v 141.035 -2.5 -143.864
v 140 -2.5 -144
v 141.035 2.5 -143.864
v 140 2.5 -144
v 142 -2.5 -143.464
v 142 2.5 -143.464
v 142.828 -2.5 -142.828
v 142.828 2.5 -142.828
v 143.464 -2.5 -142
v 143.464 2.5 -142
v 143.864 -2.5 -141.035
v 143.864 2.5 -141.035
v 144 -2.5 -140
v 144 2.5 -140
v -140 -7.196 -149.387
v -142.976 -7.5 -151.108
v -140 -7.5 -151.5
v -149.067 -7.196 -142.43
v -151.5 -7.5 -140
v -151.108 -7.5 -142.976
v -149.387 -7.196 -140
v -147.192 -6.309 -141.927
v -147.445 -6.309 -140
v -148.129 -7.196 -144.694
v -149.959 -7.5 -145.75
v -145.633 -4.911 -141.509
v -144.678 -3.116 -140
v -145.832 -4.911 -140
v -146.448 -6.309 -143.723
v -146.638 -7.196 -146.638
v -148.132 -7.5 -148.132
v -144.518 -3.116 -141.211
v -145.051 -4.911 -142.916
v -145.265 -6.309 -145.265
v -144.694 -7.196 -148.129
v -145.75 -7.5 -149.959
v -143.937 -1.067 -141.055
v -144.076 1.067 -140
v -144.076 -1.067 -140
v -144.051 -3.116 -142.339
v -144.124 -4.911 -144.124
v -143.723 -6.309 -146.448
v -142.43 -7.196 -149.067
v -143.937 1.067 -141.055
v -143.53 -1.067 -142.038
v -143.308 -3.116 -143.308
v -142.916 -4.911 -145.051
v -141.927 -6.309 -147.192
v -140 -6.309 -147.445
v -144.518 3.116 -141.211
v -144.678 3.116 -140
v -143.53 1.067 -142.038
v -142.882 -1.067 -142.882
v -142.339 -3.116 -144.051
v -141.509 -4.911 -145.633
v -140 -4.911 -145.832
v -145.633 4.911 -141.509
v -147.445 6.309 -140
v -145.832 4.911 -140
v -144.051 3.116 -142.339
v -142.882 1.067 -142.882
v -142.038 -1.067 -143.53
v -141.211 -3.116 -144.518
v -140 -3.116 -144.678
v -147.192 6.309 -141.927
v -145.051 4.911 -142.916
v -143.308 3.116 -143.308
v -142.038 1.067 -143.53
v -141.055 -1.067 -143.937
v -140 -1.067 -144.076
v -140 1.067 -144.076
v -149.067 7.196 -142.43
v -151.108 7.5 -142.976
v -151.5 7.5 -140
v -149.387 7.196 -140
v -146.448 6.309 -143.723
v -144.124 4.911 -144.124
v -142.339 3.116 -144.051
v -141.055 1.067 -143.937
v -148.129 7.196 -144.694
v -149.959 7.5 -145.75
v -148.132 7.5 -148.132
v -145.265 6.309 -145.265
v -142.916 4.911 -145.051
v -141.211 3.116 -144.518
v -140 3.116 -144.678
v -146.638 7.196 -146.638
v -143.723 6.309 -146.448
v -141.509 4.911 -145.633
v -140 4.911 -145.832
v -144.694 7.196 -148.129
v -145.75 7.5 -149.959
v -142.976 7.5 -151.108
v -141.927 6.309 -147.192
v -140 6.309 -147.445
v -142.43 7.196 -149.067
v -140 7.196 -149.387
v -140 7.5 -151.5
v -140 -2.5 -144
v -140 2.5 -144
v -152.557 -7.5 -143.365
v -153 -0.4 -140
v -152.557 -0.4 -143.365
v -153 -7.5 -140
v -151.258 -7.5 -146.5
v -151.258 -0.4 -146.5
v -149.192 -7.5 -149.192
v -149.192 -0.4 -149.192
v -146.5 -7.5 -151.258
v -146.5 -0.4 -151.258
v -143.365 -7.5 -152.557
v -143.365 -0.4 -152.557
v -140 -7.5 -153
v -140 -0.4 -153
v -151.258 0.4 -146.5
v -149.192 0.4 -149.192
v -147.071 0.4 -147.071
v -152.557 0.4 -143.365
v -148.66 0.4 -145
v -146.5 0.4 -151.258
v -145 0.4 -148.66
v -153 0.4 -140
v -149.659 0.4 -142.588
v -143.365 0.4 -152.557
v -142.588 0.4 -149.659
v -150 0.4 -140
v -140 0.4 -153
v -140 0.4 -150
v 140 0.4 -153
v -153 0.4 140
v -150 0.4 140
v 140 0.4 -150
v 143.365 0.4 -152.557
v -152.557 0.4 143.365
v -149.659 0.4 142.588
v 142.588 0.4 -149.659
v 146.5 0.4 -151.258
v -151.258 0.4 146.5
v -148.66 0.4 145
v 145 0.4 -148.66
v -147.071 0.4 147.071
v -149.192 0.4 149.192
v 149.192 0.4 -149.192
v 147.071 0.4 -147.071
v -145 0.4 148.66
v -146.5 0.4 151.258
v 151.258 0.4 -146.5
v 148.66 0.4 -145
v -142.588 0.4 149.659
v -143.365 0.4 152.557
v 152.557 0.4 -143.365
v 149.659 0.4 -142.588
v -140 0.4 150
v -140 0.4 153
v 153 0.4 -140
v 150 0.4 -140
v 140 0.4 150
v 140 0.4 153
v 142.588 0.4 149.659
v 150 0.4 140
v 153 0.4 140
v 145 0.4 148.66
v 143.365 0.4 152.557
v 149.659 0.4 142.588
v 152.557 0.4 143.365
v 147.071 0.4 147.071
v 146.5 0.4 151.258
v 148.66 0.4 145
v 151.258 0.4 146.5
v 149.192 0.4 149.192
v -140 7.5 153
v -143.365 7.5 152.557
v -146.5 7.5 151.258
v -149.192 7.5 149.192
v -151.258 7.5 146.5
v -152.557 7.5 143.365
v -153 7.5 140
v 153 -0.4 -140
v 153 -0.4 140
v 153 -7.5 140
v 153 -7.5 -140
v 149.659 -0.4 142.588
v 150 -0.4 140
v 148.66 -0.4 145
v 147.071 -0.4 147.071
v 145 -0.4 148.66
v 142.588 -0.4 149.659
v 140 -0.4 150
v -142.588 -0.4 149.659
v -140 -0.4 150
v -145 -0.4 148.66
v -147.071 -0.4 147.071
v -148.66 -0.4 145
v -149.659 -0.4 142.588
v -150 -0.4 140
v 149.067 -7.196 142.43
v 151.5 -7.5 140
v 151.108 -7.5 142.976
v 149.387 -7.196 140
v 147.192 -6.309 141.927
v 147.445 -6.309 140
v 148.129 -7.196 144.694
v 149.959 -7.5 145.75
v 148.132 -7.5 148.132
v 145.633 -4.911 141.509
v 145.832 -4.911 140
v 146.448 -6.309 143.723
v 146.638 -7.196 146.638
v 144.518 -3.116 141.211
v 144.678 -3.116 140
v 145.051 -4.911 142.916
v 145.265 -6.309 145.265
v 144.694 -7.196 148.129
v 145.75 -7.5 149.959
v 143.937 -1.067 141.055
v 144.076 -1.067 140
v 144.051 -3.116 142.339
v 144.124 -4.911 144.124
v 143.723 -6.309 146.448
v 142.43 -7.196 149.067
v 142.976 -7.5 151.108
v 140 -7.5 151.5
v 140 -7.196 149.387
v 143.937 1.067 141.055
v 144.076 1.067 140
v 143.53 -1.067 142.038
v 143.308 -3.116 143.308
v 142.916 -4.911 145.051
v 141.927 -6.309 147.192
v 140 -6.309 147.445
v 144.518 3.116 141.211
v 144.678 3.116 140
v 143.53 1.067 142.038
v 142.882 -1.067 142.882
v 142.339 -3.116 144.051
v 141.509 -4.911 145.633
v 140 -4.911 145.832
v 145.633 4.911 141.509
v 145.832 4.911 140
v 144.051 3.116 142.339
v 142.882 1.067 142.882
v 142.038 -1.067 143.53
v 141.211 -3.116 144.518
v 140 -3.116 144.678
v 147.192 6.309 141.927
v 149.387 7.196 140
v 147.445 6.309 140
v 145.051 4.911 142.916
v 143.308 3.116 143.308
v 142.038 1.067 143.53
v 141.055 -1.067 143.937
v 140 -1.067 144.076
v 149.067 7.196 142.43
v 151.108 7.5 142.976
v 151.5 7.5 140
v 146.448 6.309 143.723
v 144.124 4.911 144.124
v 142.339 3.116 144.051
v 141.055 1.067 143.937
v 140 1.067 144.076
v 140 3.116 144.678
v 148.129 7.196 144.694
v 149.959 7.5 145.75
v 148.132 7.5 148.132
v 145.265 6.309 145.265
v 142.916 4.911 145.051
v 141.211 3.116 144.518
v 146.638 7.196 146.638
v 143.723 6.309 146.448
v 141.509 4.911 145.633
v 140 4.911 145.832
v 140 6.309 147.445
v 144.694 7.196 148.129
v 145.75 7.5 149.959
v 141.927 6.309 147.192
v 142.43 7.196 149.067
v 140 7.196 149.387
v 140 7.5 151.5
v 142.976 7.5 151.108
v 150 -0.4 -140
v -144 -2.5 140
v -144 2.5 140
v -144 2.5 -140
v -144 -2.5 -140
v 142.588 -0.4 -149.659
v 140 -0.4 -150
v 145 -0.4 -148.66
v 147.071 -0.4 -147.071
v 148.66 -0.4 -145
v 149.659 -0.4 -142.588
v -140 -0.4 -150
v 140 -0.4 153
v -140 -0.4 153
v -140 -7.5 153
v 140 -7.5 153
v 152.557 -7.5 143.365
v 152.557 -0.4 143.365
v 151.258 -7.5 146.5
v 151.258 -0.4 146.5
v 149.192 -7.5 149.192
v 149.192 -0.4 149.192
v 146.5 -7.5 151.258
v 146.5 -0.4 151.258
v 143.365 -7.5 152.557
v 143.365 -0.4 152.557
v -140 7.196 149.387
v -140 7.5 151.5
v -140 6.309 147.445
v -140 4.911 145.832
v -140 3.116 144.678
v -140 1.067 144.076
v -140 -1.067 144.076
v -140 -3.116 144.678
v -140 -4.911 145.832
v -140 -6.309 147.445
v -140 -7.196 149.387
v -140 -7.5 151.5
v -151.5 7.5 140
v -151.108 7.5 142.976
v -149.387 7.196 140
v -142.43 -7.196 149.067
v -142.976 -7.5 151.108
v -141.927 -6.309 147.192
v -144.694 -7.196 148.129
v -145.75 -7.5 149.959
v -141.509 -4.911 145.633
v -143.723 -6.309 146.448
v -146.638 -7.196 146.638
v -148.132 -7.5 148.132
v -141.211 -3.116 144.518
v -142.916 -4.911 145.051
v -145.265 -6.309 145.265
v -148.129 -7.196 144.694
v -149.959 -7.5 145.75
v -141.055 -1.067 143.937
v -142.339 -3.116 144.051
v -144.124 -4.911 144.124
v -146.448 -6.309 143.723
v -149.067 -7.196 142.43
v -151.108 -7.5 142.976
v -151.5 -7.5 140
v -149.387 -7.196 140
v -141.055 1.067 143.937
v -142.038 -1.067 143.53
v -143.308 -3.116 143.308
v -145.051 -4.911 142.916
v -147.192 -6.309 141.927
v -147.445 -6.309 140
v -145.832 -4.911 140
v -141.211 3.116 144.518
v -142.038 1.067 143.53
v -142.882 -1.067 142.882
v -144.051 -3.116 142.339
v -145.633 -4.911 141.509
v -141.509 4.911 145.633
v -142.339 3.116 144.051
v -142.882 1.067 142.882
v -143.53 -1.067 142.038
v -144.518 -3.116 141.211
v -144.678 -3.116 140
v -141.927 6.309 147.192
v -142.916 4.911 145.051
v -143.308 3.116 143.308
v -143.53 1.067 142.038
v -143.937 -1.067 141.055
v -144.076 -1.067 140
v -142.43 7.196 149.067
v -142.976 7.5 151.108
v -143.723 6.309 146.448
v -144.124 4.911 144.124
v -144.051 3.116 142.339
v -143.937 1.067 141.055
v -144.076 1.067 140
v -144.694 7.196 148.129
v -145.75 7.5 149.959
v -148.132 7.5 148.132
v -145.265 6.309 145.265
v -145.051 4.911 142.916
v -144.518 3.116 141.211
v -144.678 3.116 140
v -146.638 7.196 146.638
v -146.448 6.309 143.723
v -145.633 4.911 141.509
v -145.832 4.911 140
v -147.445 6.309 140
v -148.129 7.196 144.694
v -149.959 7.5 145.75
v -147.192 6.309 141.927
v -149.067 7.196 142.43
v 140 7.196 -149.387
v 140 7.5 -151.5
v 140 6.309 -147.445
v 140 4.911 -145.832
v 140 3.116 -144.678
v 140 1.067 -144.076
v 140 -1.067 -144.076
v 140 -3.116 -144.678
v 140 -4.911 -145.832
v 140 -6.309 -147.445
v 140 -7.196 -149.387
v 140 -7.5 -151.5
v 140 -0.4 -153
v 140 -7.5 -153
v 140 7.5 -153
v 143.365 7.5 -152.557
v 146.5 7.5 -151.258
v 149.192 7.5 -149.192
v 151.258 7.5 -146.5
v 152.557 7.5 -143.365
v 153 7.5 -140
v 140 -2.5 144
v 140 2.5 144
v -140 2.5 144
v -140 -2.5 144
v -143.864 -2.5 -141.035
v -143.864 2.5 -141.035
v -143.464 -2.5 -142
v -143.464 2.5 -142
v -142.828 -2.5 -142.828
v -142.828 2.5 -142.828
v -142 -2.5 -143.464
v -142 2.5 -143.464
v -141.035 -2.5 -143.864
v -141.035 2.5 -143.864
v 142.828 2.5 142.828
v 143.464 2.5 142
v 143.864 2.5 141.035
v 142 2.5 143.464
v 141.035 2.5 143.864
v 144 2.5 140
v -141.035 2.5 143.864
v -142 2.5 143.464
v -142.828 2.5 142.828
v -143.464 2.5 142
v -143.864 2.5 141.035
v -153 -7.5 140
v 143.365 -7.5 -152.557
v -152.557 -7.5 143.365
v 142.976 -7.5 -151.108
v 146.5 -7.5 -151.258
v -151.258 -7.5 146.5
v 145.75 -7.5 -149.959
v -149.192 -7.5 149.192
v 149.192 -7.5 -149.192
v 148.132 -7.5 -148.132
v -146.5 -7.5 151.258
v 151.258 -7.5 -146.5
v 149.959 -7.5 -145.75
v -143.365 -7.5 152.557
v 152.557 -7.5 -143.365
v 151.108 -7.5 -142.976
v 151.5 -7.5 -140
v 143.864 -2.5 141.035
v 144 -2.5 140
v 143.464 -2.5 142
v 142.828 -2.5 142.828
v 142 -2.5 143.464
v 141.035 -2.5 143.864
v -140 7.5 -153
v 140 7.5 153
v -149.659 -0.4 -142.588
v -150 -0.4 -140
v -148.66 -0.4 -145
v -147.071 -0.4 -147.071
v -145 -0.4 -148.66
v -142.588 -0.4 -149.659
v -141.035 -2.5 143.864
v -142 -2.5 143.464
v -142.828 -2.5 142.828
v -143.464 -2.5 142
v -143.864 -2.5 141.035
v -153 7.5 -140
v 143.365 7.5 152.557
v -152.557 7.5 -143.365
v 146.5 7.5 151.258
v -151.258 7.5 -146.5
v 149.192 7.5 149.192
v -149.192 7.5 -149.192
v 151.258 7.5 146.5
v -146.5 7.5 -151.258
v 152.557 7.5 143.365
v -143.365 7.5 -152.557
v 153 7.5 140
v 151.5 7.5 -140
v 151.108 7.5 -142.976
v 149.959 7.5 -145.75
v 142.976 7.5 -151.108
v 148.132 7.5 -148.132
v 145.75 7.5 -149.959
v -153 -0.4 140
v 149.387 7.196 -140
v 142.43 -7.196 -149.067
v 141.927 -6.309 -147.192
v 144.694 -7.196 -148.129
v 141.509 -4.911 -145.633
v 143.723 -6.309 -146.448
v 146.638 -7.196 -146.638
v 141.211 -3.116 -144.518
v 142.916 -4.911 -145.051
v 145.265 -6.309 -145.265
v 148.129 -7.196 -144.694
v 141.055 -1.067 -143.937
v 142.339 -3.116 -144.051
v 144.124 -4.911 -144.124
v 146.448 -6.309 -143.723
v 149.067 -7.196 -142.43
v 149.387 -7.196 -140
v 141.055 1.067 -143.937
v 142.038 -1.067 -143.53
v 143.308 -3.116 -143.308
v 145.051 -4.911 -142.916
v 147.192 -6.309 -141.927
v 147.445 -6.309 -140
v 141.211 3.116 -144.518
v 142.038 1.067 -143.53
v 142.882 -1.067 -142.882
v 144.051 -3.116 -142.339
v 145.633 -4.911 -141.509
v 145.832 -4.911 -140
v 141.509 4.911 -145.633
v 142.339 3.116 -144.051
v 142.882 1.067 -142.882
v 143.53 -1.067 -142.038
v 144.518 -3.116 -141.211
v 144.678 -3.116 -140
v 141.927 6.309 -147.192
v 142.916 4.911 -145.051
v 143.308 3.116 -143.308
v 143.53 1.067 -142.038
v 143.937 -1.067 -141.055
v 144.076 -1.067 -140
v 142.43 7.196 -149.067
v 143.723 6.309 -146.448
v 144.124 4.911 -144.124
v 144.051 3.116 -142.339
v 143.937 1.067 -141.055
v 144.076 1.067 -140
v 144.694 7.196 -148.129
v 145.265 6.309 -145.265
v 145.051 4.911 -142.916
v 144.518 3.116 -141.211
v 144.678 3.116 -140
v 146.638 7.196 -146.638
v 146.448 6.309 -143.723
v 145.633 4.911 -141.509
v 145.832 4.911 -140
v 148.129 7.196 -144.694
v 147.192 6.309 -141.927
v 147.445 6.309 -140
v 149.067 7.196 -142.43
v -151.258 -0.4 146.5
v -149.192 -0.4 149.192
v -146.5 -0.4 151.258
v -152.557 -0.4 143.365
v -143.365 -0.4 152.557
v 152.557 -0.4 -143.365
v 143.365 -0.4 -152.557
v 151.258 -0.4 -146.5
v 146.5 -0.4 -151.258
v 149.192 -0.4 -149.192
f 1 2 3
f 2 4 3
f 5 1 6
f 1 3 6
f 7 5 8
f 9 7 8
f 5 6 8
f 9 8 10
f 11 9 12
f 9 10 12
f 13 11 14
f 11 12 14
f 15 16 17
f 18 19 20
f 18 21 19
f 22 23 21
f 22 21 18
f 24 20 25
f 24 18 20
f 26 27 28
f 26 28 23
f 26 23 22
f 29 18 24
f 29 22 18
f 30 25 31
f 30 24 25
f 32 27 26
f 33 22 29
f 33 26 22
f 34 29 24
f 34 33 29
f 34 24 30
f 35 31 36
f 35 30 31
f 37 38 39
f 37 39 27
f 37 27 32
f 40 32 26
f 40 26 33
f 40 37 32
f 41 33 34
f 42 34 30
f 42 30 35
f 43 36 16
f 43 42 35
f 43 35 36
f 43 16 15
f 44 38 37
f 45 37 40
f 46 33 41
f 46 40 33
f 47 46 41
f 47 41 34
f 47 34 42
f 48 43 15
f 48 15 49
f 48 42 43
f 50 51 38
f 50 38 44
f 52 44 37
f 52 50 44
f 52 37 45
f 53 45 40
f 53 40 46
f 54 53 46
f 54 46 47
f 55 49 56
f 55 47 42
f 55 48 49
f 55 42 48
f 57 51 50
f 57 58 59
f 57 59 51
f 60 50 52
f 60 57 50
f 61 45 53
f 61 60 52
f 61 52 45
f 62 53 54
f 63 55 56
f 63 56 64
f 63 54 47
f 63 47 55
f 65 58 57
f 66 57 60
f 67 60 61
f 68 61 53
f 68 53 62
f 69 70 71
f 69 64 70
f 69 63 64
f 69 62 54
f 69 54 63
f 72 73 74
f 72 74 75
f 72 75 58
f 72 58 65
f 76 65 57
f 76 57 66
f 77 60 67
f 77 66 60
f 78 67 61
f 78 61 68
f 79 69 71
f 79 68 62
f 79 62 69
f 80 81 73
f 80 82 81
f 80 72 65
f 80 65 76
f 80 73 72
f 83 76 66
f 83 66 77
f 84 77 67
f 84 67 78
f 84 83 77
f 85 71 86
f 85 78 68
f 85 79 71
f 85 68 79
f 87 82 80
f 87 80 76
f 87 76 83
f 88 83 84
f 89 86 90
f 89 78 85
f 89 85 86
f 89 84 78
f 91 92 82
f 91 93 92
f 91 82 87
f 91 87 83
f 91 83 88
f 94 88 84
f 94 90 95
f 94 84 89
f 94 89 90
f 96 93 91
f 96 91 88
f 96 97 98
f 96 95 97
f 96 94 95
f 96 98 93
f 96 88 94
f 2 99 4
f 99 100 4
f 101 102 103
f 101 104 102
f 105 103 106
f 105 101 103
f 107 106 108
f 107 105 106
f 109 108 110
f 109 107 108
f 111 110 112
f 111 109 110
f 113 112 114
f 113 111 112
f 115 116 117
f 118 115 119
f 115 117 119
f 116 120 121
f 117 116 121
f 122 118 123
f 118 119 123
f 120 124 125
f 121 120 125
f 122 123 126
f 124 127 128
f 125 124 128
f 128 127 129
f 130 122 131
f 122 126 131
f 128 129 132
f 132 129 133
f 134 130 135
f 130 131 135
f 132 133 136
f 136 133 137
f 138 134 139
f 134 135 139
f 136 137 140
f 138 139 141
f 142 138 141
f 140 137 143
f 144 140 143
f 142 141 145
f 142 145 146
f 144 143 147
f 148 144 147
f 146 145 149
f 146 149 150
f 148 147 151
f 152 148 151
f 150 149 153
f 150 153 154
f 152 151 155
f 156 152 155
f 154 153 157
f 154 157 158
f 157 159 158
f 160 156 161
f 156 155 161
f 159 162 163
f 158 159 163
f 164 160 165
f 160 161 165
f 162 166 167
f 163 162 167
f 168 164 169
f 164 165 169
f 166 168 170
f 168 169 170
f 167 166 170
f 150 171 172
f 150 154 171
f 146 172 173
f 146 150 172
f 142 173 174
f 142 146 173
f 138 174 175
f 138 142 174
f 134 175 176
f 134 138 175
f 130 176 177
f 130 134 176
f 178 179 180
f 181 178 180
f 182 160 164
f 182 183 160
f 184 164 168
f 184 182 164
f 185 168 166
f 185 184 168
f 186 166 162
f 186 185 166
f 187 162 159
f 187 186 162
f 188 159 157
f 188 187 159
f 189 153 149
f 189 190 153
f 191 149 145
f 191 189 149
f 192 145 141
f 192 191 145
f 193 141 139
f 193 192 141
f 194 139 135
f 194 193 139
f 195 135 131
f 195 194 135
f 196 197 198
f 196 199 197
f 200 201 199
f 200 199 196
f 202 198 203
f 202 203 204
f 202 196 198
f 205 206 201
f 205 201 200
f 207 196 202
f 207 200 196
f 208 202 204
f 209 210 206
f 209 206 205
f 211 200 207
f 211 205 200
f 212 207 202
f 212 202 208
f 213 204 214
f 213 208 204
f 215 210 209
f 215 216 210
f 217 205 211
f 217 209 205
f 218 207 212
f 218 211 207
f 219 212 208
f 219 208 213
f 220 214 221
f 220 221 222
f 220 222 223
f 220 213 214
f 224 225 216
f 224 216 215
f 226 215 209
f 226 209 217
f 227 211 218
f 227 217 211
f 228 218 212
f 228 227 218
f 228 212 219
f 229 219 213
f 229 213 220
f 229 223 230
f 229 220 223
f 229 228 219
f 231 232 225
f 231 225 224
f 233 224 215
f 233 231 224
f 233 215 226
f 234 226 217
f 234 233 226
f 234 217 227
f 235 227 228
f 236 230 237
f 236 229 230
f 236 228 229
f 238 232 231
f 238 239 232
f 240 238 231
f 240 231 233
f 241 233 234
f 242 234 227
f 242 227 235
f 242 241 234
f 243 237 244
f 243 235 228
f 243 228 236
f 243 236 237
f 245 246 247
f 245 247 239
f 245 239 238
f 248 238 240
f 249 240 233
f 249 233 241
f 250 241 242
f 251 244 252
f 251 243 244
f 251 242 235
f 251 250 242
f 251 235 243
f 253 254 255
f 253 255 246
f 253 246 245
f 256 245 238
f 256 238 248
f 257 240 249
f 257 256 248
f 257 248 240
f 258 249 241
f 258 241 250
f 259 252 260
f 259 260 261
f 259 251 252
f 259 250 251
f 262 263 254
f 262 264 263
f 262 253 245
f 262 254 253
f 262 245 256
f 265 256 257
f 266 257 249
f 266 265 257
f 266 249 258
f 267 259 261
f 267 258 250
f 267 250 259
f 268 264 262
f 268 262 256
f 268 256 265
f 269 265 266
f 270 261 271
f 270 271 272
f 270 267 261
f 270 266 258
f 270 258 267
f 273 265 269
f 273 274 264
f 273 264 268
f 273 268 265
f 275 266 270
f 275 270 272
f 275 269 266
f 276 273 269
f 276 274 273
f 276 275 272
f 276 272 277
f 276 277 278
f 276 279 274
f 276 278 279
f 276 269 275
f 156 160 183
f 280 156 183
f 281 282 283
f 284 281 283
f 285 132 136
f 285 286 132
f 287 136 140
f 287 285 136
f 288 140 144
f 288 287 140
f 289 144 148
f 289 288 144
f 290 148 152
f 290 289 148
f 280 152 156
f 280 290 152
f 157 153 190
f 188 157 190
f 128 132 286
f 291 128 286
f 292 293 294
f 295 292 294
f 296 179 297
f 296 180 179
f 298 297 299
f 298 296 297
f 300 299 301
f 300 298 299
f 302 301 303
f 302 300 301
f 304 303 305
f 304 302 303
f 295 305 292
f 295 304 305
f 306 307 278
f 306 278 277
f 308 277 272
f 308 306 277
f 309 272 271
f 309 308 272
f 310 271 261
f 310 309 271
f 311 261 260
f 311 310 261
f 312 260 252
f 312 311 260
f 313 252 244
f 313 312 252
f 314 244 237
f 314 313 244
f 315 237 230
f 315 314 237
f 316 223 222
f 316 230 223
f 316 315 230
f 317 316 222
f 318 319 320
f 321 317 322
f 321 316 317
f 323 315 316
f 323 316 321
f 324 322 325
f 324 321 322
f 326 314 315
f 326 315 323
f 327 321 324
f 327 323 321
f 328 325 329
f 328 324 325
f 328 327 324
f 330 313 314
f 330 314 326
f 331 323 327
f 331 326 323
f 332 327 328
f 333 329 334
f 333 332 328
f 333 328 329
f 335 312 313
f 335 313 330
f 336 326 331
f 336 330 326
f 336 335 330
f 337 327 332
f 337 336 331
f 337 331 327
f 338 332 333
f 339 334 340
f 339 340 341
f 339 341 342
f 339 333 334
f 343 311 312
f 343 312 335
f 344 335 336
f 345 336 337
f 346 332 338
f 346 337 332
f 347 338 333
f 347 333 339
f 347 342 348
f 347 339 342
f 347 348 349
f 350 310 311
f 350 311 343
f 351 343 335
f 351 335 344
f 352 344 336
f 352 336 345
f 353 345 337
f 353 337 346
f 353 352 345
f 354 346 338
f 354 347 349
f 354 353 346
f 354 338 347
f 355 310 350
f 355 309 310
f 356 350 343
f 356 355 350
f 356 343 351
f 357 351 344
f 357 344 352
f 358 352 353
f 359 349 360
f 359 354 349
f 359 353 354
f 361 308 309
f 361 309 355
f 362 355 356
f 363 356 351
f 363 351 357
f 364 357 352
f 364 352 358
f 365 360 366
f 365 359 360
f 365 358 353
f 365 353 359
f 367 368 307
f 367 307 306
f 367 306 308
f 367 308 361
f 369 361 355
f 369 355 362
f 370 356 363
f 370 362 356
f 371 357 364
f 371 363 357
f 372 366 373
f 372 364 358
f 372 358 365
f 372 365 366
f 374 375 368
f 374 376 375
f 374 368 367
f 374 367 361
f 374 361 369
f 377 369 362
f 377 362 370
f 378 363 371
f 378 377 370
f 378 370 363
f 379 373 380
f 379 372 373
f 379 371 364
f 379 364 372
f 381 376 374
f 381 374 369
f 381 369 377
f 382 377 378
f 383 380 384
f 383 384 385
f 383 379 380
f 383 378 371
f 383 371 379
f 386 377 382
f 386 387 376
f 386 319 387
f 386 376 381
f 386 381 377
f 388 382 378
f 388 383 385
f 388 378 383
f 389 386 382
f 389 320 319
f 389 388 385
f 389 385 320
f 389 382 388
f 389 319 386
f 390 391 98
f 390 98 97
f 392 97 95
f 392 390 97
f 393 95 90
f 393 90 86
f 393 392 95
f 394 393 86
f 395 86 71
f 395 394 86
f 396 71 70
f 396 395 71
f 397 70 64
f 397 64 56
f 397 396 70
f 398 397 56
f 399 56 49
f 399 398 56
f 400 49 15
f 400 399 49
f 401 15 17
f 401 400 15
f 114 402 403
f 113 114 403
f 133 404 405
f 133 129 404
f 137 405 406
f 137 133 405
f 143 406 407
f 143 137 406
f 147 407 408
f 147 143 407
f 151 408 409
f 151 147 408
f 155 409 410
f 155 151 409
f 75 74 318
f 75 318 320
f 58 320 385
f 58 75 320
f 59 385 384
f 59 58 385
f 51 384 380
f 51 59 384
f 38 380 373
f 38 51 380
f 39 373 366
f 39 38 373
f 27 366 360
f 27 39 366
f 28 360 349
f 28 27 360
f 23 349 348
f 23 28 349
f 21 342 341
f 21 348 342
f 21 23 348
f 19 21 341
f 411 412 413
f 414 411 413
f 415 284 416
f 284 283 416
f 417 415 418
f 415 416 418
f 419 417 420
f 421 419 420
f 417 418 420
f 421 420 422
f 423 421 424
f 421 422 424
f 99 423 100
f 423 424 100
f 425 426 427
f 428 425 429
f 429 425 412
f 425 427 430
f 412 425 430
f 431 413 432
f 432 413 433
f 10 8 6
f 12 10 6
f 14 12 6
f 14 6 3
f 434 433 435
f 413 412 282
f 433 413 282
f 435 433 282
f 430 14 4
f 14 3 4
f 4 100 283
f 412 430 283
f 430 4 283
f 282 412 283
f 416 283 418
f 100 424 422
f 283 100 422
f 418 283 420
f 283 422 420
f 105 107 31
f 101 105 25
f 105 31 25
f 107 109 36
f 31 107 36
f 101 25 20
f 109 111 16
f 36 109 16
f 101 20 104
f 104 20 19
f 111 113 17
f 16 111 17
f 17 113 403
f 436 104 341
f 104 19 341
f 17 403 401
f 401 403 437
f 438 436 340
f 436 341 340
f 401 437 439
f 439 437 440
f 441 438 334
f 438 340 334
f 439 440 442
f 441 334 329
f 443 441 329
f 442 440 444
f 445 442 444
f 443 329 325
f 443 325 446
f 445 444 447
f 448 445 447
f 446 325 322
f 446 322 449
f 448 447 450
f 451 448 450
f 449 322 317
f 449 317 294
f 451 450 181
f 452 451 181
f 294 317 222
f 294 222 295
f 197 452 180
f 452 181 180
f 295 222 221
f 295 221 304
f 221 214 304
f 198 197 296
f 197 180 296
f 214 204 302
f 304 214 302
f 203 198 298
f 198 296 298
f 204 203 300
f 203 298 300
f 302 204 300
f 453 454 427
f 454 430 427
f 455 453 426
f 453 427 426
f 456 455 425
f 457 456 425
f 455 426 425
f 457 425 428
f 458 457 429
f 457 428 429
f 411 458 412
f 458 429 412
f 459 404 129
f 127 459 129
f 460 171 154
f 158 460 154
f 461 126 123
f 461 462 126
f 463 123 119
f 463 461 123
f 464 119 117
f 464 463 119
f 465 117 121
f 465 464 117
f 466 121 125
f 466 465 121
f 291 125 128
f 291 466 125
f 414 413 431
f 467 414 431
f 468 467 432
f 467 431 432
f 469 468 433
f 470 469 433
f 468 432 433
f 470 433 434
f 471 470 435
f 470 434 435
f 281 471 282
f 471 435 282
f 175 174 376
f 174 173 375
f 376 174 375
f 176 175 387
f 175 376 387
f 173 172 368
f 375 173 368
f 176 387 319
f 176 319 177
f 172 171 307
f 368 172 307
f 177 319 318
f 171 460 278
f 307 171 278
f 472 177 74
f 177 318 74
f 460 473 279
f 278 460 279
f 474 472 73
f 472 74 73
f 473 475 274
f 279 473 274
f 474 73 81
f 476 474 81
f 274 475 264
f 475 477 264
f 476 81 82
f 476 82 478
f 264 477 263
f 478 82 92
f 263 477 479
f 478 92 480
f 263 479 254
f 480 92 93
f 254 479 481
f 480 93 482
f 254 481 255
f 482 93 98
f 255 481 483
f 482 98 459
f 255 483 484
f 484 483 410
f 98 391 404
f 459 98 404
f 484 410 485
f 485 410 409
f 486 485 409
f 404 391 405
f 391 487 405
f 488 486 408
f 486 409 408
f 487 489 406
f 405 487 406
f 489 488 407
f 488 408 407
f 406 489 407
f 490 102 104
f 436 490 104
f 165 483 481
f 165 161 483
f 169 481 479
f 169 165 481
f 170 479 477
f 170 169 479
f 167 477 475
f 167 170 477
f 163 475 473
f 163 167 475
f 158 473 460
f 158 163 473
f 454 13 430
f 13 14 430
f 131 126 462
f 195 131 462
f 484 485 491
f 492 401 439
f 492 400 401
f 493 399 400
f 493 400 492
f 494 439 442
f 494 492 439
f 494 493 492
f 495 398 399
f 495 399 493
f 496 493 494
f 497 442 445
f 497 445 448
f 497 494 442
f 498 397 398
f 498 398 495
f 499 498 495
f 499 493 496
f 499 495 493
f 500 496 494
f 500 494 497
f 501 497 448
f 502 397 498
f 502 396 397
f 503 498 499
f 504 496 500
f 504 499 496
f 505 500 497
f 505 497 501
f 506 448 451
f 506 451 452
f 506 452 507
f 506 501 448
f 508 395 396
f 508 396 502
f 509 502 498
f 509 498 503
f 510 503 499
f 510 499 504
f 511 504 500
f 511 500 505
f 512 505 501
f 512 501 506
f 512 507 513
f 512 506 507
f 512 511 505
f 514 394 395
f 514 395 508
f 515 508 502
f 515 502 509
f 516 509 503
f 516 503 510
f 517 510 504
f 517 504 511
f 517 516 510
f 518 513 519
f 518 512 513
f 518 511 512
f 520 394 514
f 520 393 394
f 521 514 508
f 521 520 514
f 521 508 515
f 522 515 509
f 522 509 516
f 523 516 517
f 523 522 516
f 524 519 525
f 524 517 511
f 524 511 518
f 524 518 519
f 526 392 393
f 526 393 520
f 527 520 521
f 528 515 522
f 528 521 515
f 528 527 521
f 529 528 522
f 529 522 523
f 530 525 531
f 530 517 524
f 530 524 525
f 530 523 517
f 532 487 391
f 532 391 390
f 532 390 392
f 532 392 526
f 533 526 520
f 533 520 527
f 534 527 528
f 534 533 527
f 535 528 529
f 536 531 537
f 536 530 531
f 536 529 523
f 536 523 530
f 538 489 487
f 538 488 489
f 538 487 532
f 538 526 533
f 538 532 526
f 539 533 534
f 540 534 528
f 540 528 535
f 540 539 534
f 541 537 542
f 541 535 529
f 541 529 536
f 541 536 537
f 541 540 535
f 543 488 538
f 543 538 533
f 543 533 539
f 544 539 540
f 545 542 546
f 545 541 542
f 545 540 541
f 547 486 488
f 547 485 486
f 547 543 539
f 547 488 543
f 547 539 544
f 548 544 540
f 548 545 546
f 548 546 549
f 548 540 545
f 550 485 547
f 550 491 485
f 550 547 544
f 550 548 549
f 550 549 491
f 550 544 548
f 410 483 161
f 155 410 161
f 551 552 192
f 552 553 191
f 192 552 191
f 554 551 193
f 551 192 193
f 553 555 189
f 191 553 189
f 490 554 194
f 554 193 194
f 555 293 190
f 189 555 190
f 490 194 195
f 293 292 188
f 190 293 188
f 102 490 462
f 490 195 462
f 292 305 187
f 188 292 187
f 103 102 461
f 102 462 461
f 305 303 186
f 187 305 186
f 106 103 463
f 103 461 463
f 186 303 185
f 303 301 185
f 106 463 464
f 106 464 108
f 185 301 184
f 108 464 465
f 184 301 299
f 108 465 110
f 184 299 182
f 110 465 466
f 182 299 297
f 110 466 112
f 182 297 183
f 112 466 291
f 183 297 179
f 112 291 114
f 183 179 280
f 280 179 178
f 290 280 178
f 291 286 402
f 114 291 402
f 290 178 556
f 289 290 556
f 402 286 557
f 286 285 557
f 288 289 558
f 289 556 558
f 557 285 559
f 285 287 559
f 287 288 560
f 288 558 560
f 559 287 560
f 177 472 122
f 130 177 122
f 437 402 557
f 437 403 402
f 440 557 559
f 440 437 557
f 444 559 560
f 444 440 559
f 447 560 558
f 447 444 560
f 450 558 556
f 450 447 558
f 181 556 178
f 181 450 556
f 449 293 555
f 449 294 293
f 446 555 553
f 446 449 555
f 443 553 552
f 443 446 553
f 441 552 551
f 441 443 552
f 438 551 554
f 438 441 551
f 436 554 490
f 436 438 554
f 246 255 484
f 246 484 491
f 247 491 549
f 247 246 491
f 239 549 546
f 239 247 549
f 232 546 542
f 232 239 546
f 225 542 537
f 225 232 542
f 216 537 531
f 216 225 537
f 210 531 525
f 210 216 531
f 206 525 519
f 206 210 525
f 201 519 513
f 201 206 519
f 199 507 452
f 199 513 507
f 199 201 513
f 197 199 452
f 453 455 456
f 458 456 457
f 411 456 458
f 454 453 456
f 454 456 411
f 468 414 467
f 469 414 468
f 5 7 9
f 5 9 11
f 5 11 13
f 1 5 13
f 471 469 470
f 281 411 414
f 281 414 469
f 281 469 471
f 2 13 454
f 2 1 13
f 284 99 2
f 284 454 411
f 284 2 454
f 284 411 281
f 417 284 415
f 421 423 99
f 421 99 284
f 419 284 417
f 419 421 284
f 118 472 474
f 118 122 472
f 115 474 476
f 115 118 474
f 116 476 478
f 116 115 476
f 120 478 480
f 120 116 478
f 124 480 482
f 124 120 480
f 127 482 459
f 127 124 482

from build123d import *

# Parameters (mm, degrees)
BOSS_EXTRUDE1_DEPTH = 2.5


with BuildPart() as part:
    # Sweep1: sweep along a path in Sketch1
    with BuildLine(Plane(origin=(0, 0, 0), x_dir=(1, 0, 0), z_dir=(0, 1, 0))) as sweep1_path:
        Line((-140, 150), (140, 150))
        ThreePointArc((140, 150), (147.071067812, 147.071067812), (150, 140))
        Line((150, 140), (150, -140))
        ThreePointArc((150, -140), (147.071067812, -147.071067812), (140, -150))
        Line((140, -150), (-140, -150))
        ThreePointArc((-140, -150), (-147.071067812, -147.071067812), (-150, -140))
        Line((-150, -140), (-150, 140))
        ThreePointArc((-150, 140), (-147.071067812, 147.071067812), (-140, 150))
    # Sketch7 → Sweep1 (sweep)
    with BuildSketch(Plane.XY):
        with BuildLine():
            Line((-150, 0.4), (-150, -0.4))
            Line((-150, -0.4), (-153, -0.4))
            Line((-153, -0.4), (-153, -7.5))
            Line((-153, -7.5), (-151.5, -7.5))
            ThreePointArc((-151.5, -7.5), (-144, 0), (-151.5, 7.5))
            Line((-151.5, 7.5), (-153, 7.5))
            Line((-153, 7.5), (-153, 0.4))
            Line((-153, 0.4), (-150, 0.4))
        make_face()
    sweep(path=sweep1_path.line)


with BuildPart() as body_2:
    # Sketch8 → Boss-Extrude1 (new, symmetric)
    with BuildSketch(Plane(origin=(0, 0, 0), x_dir=(1, 0, 0), z_dir=(0, 1, 0))):
        with BuildLine():
            Line((-144, -140), (-144, 0))
            Line((-144, 0), (-144, 140))
            ThreePointArc((-144, 140), (-142.828427125, 142.828427125), (-140, 144))
            Line((-140, 144), (140, 144))
            ThreePointArc((140, 144), (142.828427125, 142.828427125), (144, 140))
            Line((144, 140), (144, -140))
            ThreePointArc((144, -140), (142.828427125, -142.828427125), (140, -144))
            Line((140, -144), (-140, -144))
            ThreePointArc((-140, -144), (-142.828427125, -142.828427125), (-144, -140))
        make_face()
    extrude(amount=BOSS_EXTRUDE1_DEPTH, both=True)


solid = Compound([part.part, body_2.part])
